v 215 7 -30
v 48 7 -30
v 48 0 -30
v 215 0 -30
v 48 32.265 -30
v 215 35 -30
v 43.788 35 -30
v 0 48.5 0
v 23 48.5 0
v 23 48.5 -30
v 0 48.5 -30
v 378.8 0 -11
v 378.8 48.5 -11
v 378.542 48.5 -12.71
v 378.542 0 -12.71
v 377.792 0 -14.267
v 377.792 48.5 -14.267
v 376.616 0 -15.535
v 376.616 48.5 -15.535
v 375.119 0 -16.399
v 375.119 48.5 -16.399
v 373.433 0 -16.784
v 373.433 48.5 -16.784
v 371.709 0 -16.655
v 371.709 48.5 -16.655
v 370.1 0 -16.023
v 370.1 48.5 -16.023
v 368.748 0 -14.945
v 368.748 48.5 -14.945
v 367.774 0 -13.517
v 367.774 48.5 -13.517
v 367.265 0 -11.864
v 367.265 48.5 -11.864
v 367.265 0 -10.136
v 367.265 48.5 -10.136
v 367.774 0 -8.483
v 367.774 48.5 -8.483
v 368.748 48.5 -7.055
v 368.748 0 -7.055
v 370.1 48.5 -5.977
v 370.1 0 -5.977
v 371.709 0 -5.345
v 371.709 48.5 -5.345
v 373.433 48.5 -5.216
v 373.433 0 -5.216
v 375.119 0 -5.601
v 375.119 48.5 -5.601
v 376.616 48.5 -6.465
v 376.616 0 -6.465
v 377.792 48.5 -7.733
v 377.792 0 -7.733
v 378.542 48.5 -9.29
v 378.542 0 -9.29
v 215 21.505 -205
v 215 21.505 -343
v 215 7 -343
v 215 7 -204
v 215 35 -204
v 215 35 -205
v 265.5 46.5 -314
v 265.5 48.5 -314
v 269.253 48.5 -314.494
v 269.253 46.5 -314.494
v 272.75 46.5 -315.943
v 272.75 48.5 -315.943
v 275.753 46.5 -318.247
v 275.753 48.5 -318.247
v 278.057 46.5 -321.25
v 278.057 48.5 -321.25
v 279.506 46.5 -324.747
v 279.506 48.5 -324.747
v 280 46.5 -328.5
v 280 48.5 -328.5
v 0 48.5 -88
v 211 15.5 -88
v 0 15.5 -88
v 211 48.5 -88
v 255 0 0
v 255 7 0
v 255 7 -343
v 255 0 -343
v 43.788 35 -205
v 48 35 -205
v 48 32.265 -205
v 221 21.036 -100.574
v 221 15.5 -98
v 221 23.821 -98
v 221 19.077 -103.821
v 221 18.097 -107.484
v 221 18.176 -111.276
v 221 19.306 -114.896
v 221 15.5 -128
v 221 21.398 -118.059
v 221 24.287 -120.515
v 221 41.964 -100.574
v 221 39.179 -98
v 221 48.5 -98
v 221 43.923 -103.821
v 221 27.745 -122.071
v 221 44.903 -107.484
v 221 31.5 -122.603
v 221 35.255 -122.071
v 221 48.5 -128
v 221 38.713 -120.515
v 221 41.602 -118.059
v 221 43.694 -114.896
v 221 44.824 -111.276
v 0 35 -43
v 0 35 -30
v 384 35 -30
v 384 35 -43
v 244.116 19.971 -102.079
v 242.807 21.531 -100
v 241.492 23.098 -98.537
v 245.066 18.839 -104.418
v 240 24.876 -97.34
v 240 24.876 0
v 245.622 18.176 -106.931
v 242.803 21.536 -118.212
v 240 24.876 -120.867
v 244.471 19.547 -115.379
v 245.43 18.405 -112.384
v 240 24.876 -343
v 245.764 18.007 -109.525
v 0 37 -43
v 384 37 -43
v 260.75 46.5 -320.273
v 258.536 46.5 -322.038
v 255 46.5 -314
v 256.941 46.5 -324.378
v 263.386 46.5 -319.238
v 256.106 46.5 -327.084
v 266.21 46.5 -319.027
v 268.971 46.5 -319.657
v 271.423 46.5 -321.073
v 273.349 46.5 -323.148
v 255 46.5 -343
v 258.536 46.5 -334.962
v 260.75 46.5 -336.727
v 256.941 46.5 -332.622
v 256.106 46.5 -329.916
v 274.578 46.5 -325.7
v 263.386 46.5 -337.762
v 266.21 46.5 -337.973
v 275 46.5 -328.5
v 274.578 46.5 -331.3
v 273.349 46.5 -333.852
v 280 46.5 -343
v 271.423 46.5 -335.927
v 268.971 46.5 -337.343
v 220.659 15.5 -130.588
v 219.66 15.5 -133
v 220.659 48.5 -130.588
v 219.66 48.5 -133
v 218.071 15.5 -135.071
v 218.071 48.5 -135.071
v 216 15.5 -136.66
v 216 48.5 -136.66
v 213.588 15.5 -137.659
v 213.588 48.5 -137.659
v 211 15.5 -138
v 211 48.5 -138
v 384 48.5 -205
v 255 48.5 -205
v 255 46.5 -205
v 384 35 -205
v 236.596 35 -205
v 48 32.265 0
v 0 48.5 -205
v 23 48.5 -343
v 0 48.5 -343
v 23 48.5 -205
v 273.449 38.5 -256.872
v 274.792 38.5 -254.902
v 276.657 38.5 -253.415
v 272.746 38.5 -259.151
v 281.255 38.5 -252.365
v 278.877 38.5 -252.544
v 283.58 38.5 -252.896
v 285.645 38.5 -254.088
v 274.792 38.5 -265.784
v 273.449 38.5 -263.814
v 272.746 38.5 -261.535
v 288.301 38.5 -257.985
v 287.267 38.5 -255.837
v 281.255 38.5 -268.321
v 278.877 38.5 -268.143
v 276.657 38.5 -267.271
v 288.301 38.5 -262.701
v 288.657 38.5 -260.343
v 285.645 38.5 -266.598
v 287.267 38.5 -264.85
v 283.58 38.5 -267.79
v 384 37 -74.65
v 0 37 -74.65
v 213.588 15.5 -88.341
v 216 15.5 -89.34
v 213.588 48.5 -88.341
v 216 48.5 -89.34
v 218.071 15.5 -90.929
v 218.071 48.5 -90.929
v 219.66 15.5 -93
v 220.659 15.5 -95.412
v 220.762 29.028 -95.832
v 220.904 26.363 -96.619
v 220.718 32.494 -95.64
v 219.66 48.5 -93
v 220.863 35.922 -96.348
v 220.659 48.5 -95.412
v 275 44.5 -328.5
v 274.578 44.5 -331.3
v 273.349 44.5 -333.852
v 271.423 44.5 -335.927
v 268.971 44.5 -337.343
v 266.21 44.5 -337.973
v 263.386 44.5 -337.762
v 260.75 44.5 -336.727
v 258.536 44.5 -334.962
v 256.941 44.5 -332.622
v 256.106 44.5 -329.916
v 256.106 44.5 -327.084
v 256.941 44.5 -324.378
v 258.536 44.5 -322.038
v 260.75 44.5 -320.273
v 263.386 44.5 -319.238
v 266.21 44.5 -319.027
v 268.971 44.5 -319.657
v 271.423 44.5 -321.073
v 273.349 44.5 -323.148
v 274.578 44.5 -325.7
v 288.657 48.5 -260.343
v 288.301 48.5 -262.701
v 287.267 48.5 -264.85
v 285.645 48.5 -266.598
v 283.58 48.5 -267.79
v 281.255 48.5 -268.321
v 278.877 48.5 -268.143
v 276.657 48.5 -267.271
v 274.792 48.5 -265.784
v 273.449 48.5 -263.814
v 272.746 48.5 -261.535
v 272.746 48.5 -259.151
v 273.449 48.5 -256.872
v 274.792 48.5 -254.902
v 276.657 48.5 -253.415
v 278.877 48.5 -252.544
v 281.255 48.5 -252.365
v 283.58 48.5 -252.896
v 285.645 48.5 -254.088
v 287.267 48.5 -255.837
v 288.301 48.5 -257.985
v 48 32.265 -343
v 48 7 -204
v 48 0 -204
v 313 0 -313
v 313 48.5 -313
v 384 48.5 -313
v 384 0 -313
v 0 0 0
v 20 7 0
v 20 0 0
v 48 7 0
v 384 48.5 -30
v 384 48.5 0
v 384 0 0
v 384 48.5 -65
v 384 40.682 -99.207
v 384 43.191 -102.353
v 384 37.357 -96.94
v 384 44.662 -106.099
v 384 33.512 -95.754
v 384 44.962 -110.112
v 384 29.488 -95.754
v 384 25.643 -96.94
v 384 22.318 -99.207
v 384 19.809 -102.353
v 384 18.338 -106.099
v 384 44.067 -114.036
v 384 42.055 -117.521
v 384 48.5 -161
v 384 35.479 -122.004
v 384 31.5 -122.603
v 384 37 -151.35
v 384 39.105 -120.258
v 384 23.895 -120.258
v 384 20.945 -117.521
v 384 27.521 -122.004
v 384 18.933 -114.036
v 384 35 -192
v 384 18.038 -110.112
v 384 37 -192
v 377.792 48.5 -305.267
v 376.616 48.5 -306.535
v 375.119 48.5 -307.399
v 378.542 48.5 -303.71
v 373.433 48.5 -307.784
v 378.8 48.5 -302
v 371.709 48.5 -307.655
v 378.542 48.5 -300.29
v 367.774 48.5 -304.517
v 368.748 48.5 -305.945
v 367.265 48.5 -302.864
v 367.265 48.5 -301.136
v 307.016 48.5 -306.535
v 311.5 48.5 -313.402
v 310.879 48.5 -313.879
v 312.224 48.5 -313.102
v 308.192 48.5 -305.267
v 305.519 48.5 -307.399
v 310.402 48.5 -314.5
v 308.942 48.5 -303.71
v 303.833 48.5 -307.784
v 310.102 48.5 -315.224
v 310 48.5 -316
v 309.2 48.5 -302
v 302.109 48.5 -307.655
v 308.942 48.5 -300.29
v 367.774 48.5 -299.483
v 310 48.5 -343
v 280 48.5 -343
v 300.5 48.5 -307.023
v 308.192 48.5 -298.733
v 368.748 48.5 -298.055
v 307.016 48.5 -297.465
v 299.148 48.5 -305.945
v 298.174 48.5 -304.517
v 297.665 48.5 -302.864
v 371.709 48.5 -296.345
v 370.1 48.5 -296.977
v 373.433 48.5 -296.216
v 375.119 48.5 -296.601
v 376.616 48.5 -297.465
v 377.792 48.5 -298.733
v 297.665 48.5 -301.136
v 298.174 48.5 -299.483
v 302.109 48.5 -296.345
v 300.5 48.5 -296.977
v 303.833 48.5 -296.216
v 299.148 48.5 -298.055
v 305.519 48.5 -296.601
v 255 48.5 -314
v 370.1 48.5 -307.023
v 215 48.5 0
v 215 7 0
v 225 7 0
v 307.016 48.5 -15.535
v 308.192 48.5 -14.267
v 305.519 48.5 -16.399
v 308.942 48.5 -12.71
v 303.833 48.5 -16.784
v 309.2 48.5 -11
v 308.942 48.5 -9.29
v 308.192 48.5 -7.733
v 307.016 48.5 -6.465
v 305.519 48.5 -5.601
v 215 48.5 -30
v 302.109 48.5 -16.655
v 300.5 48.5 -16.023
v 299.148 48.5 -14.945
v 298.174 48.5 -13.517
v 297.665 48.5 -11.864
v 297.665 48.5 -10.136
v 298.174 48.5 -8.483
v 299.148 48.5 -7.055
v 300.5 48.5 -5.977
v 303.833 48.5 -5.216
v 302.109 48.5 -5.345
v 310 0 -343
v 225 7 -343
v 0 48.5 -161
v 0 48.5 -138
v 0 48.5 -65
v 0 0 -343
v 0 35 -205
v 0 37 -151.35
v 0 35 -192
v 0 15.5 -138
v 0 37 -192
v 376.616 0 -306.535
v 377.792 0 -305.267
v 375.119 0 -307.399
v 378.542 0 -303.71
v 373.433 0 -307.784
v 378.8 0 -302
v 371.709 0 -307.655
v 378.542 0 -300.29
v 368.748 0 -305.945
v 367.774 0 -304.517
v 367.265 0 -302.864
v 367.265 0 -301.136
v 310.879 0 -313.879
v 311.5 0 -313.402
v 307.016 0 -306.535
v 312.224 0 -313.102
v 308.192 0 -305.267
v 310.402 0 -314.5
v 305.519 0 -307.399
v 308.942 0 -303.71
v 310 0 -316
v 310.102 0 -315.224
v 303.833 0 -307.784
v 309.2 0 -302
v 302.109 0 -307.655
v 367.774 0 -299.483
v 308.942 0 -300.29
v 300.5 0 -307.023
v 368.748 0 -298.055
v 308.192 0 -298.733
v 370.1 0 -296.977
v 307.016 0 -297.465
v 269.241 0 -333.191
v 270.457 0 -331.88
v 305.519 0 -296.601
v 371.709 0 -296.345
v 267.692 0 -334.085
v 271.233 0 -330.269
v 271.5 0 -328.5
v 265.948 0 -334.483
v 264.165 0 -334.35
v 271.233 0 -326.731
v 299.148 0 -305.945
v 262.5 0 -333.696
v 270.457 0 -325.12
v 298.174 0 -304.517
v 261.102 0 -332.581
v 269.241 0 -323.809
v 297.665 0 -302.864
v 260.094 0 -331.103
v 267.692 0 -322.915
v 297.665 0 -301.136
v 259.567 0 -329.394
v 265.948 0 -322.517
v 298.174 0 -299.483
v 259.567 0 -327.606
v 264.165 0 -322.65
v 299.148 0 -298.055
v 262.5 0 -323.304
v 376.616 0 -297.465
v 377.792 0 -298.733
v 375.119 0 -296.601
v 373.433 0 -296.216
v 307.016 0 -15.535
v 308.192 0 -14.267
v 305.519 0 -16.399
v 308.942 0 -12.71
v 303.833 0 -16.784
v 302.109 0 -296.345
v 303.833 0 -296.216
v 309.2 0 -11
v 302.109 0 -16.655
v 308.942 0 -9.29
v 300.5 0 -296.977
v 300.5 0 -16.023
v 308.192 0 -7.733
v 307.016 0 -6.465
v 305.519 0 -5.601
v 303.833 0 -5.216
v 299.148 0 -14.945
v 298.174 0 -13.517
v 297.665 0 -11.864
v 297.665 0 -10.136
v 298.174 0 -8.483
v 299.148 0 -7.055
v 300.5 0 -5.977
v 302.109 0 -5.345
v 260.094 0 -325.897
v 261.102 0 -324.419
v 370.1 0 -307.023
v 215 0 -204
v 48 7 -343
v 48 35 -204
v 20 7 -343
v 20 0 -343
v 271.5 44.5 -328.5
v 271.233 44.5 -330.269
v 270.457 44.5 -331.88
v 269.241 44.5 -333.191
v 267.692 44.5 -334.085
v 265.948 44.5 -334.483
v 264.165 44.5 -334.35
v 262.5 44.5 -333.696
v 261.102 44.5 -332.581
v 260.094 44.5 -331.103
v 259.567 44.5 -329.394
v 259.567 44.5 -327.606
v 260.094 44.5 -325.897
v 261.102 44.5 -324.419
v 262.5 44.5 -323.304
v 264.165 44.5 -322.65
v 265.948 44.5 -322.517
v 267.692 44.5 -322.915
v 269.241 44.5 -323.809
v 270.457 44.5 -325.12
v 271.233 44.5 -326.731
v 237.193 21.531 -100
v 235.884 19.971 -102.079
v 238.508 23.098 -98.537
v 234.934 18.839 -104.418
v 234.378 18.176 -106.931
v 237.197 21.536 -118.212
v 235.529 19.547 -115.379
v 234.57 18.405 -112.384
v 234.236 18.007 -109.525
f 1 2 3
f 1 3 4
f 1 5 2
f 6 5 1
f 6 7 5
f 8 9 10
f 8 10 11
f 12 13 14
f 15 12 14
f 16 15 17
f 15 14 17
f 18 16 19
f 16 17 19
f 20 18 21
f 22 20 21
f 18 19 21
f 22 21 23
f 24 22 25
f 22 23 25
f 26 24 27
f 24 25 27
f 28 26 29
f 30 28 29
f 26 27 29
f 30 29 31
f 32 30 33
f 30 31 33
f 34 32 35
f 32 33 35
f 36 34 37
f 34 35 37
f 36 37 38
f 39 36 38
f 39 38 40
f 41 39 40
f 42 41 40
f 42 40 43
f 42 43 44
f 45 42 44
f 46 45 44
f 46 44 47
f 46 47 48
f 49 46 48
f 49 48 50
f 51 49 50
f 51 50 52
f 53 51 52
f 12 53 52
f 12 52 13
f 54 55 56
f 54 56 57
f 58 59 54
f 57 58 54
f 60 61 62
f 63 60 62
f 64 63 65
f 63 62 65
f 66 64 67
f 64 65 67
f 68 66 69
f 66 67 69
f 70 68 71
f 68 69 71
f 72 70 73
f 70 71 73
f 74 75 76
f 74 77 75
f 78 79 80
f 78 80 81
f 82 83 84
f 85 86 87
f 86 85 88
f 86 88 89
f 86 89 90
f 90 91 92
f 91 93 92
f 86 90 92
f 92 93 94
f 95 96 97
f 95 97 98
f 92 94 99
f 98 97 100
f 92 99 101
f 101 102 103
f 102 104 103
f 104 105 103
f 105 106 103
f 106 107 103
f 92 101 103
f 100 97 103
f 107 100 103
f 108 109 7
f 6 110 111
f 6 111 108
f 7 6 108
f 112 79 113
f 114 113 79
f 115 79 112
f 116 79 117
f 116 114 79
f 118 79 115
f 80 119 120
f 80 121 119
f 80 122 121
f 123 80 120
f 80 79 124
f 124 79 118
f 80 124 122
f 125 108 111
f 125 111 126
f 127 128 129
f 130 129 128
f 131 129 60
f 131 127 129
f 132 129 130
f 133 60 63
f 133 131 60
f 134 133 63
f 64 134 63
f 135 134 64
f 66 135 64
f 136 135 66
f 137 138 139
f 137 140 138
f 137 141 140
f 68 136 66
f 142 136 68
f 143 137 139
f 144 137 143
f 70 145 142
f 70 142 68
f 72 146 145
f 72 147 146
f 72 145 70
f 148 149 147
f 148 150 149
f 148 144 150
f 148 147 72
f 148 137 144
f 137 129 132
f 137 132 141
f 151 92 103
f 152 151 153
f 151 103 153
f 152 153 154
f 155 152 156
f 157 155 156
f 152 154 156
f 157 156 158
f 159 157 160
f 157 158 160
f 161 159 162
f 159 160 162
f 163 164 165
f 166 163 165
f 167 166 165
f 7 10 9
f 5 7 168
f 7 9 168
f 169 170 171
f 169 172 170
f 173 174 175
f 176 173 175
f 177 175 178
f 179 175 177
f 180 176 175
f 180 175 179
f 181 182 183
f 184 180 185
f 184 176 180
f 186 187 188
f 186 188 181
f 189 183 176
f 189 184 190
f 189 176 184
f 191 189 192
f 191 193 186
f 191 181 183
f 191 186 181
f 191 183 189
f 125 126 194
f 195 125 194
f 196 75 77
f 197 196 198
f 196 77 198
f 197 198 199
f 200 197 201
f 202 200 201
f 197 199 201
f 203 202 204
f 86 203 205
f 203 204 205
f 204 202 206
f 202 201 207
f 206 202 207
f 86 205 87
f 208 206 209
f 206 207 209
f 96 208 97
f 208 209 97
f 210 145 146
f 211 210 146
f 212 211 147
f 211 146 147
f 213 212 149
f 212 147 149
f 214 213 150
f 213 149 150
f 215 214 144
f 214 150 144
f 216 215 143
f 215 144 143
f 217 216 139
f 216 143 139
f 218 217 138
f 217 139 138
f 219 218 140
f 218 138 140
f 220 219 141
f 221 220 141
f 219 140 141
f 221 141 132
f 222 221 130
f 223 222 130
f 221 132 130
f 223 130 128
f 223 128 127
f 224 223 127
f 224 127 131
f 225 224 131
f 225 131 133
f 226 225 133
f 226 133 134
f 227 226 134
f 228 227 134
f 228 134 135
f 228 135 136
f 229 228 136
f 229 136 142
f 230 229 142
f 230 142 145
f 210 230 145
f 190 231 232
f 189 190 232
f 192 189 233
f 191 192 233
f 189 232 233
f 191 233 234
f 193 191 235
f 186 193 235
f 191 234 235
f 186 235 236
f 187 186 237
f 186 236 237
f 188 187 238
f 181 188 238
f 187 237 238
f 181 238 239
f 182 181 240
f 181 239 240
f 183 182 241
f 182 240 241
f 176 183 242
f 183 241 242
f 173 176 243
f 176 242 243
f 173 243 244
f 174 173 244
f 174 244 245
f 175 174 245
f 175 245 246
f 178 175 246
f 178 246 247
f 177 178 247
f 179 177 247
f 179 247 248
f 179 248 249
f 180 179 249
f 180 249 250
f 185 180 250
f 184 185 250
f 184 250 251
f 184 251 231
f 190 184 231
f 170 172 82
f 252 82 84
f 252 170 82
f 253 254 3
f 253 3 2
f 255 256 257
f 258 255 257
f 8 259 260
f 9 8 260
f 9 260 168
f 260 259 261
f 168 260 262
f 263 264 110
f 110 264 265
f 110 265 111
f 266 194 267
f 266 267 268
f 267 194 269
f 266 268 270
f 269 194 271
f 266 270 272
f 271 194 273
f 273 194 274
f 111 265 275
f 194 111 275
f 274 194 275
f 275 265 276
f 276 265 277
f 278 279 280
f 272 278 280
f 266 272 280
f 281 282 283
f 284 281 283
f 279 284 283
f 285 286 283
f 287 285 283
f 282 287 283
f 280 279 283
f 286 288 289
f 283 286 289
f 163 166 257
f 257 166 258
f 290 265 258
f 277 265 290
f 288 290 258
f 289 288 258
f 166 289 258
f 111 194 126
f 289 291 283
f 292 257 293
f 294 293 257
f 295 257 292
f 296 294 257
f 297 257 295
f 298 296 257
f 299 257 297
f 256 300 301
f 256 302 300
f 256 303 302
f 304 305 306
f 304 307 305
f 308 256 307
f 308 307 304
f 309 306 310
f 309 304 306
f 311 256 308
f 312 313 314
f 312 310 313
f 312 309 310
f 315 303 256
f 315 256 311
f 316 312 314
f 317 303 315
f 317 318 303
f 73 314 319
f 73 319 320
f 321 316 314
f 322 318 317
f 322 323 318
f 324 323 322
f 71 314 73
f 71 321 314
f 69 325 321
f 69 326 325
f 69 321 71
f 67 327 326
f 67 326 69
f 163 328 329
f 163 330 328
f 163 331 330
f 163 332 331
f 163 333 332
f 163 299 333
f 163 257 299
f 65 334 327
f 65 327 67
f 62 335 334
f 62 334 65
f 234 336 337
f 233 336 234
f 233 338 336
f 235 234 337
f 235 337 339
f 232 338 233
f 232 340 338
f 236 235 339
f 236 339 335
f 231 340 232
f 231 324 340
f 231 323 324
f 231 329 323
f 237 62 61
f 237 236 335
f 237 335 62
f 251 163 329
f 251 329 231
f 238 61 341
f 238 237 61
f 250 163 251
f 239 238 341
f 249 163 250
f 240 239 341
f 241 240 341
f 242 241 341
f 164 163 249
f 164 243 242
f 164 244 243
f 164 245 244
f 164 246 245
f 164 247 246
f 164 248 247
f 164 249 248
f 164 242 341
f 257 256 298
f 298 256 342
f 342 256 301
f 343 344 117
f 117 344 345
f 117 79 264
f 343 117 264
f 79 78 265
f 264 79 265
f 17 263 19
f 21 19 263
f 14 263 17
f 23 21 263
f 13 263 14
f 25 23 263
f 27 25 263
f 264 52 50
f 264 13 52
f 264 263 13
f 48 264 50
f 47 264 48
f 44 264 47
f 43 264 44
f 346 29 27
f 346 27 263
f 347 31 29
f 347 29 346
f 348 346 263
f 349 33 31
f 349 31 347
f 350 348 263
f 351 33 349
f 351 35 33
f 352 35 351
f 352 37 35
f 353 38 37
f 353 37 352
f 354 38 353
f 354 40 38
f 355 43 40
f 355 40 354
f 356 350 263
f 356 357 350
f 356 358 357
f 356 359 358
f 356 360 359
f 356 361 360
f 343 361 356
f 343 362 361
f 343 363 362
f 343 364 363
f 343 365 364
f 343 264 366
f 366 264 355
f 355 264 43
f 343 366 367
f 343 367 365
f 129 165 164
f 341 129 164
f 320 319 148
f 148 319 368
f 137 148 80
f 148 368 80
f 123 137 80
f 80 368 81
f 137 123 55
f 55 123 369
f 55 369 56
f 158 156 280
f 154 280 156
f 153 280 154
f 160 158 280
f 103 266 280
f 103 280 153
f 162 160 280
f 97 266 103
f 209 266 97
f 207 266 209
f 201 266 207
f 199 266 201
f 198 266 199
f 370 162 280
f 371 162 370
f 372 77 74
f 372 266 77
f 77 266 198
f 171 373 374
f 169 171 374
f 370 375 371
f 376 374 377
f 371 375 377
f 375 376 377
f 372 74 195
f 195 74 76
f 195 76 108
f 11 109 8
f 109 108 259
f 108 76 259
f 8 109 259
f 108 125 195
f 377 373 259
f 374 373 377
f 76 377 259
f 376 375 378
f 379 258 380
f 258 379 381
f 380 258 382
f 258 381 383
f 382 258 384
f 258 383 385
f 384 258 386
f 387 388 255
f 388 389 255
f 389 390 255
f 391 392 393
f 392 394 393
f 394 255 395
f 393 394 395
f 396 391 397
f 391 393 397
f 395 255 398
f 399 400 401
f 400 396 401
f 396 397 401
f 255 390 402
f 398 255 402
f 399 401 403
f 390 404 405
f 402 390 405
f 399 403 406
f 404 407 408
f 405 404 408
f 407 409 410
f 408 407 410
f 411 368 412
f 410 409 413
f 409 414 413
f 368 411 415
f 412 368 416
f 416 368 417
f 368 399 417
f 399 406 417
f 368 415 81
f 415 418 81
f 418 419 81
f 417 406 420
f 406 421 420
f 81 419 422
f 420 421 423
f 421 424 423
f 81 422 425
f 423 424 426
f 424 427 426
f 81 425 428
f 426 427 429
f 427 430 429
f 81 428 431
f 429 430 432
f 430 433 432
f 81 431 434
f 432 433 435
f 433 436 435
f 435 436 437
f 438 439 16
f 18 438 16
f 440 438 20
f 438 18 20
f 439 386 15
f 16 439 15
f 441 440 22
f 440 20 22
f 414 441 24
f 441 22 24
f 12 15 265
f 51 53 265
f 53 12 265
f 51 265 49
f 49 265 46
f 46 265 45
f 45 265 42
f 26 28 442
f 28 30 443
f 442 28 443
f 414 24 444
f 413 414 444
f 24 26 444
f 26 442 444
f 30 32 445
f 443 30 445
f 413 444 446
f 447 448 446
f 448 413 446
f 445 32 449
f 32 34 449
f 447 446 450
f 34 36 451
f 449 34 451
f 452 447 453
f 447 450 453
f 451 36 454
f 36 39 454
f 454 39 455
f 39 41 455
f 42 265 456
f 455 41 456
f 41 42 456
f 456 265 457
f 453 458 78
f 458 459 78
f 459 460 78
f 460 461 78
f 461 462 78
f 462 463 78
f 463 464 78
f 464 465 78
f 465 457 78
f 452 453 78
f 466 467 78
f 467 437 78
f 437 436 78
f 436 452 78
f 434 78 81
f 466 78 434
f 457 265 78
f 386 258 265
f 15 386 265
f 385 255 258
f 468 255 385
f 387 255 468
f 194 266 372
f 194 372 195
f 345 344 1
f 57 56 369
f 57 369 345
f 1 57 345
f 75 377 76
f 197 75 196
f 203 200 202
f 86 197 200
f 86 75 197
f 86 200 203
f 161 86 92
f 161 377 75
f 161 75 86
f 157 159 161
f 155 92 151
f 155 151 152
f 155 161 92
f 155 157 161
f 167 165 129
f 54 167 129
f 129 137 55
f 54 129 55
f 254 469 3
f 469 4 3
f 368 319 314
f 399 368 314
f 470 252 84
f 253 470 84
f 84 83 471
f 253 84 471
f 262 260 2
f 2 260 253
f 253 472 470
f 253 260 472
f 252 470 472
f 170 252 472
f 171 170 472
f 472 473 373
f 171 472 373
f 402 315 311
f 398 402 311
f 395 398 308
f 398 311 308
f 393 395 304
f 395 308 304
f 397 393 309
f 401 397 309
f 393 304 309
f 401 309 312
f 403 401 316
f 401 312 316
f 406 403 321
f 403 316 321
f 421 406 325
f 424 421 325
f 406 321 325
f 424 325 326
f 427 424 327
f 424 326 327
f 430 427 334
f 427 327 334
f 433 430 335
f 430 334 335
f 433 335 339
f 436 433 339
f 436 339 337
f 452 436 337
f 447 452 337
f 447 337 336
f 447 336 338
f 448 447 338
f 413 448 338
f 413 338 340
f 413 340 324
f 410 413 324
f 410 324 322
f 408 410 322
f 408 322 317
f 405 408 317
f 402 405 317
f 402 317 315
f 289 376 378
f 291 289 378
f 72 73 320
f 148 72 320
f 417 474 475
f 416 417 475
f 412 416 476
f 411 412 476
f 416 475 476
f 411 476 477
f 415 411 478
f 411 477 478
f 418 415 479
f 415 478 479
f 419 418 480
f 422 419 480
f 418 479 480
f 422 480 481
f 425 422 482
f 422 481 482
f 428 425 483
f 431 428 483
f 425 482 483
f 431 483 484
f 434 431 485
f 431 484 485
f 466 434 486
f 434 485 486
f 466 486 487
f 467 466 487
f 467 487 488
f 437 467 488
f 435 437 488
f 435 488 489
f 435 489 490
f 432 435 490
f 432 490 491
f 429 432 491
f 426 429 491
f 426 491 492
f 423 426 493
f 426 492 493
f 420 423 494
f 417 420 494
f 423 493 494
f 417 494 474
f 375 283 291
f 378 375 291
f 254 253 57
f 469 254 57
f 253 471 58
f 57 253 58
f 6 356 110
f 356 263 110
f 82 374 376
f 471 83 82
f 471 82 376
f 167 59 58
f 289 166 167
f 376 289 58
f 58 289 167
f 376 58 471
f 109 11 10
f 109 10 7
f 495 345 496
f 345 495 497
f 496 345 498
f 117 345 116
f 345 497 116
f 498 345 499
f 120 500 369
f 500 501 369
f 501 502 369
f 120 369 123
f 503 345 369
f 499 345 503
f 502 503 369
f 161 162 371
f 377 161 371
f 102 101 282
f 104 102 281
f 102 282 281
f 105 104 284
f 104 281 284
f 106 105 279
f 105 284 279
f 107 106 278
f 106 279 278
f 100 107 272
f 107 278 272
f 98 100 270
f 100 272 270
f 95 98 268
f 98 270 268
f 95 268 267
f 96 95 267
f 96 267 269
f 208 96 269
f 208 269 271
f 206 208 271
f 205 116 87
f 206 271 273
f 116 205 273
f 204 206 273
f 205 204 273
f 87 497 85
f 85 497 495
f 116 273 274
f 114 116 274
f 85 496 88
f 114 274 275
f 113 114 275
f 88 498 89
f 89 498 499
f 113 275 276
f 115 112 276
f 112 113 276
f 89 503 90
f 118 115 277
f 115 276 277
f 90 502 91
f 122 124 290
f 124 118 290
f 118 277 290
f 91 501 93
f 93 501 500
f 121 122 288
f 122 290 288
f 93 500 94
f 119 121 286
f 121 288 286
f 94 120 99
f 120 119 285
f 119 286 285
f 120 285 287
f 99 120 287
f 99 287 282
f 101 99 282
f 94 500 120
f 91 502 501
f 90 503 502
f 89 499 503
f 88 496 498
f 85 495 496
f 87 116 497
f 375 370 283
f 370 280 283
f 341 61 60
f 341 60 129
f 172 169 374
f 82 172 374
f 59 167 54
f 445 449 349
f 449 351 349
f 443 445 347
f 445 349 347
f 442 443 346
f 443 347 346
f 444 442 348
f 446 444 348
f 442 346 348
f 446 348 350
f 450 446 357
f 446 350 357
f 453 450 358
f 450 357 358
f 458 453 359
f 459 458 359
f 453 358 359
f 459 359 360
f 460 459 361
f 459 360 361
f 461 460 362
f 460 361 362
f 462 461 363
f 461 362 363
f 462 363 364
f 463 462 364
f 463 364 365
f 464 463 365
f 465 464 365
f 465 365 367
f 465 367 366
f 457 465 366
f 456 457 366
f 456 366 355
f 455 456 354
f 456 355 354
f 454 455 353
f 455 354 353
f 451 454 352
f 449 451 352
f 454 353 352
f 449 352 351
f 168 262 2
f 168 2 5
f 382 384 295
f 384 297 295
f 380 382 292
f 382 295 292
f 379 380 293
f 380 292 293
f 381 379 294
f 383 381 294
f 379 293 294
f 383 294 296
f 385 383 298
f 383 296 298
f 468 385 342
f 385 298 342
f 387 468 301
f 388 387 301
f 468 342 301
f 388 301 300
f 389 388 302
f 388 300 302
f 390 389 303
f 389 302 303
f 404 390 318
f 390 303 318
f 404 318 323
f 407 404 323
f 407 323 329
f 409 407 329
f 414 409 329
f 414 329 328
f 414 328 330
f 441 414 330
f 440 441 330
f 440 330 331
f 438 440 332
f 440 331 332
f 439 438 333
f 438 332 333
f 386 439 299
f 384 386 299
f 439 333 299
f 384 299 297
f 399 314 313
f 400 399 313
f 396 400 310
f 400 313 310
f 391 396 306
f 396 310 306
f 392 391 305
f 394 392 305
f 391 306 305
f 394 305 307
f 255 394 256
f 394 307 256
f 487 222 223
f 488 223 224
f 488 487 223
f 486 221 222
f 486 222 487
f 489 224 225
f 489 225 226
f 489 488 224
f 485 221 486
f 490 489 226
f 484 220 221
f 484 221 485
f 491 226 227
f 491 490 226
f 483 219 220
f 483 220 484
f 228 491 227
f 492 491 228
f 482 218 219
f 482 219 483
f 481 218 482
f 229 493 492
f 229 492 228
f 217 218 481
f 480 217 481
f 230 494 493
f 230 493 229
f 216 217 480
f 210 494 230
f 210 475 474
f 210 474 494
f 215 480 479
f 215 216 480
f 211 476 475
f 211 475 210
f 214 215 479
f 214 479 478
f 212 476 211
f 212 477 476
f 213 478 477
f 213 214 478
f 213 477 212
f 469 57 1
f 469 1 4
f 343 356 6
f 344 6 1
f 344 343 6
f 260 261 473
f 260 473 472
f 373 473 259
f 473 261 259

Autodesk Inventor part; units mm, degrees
ref_plane "YZ Plane" through (0, 0, 0) normal (1, 0, 0) x (0, 1, 0)
ref_plane "XZ Plane" through (0, 0, 0) normal (0, 1, 0) x (-1, 0, 0)
ref_plane "XY Plane" through (0, 0, 0) normal (0, 0, 1) x (1, 0, 0)
sketch "Sketch1" plane through (0, 0, 0) normal (0, 1, 0) x (-1, 0, 0)
  line L0 (0, 0) -> (-384, 0)
  line L1 (-384, 0) -> (-384, -343)
  line L2 (-384, -343) -> (0, -343)
  line L3 (0, -343) -> (0, 0)
  dimension "d0" = 384
  dimension "d1" = 343
extrude "Extrusion1" add sketch "Sketch1" along normal blind 48.5
sketch "Sketch3" plane through (384, 0, 0) normal (1, 0, 0) x (0, 0, -1)
  line L0 (0, 0) -> (343, 0) projected
  line L1 (0, 0) -> (0, 48.5) projected
  line L2 (343, 0) -> (343, 48.5) projected
  line L3 (30, 48.5) -> (65, 48.5)
  line L4 (30, 48.5) -> (30, 37)
  line L5 (65, 48.5) -> (74.6496, 37)
  line L6 (43, 37) -> (74.6496, 37)
  line L7 (30, 37) -> (30, 35)
  line L8 (30, 35) -> (43, 35)
  line L9 (43, 35) -> (43, 37)
  dimension "d23" = 35
  dimension "d37" = 2
  dimension "d38" = 13
extrude "Extrusion2" cut sketch "Sketch3" against normal through all
sketch "Sketch7" plane through (384, 0, 0) normal (1, 0, 0) x (0, 0, -1)
  line L0 (65, 48.5) -> (343, 48.5) projected
  line L1 (65, 48.5) -> (161, 48.5)
  line L2 (161, 48.5) -> (174.2196, 48.5) construction
  line L3 (161, 48.5) -> (205, 48.5)
  line L4 (0, 0) -> (343, 0) projected
  line L5 (151.3504, 37) -> (192, 37)
  line L6 (205, 37) -> (205, 48.5)
  line L7 (161, 48.5) -> (151.3504, 37)
  line L8 (161, 48.5) -> (183.0653, 48.5) construction
  line L9 (205, 37) -> (205, 35)
  line L10 (205, 35) -> (192, 35)
  line L11 (192, 35) -> (192, 37)
  dimension "d27" = 96
  dimension "d29" = 44
  dimension "d32" = 130
extrude "Extrusion3" cut sketch "Sketch7" against normal through all
sketch "Sketch8" plane through (0, 48.5, 0) normal (0, 1, 0) x (1, 0, 0)
  line L0 (310, 343) -> (310, 316)
  line L1 (313, 313) -> (384, 313)
  line L2 (384, 0) -> (384, 343) projected
  line L3 (384, 313) -> (384, 343)
  line L4 (384, 343) -> (310, 343)
  line L5 (384, 343) -> (0, 343) projected
  arc A0 (310, 316) -> (313, 313) centre (313, 316) ccw
  point P0 (0, 0)
  point P1 (310, 313)
  dimension "d43" = 30
  dimension "d46" = 3
extrude "Extrusion4" cut sketch "Sketch8" against normal through all
sketch "Sketch9" plane through (0, 0, -343) normal (0, 0, -1) x (-1, 0, 0)
  line L0 (-215, 7) -> (-225, 7)
  line L1 (-255, 7) -> (-255, 0)
  line L2 (-255, 7) -> (-240, 24.8763)
  line L3 (-225, 7) -> (-240, 24.8763)
  line L4 (-215, 7) -> (-215, 0)
  line L5 (-255, 0) -> (-215, 0)
  dimension "d50" = 10
extrude "Extrusion5" cut sketch "Sketch9" against normal through all
sketch "Sketch10" plane through (0, 48.5, 0) normal (0, 1, 0) x (1, 0, 0)
  line L0 (215, 343) -> (215, 0) projected
  line L1 (215, 343) -> (215, 0) projected
  line L2 (310, 343) -> (0, 343) projected
  line L3 (384, 151.3504) -> (0, 151.3504) projected
  line L4 (215, 343) -> (48, 343)
  line L5 (48, 343) -> (48, 204)
  line L6 (48, 204) -> (215, 204)
  line L7 (215, 204) -> (215, 343)
  point P0 (0, 0)
  dimension "d58" = 167
  dimension "d59" = 139
extrude "Extrusion6" cut sketch "Sketch10" against normal through all
sketch "Sketch11" plane through (0, 0, -343) normal (0, 0, -1) x (-1, 0, 0)
  line L0 (-20, 0) -> (-20, 7)
  line L1 (-20, 7) -> (-48, 7)
  line L2 (-48, 0) -> (-48, 7)
  line L3 (-48, 0) -> (-20, 0)
  dimension "d65" = 7
extrude "Extrusion7" cut sketch "Sketch11" against normal through all
sketch "Sketch12" plane through (0, 48.5, 0) normal (0, 1, 0) x (1, 0, 0)
  line L0 (221, 113) -> (221, 128)
  line L1 (211, 88) -> (0, 88)
  line L2 (211, 138) -> (0, 138)
  arc A0 (211, 88) -> (221, 98) centre (211, 98) ccw
  arc A1 (221, 128) -> (211, 138) centre (211, 128) ccw
  line L3 (221, 98) -> (221, 113)
  line L4 (0, 88) -> (0, 138)
  point P0 (384, 161)
  point P1 (221, 88)
  dimension "d72" = 10
extrude "Extrusion8" cut sketch "Sketch12" against normal blind 33
sketch "Sketch14" plane through (384, 0, 0) normal (1, 0, 0) x (0, 0, -1)
  circle A0 centre (109.1034, 31.5) radius 13.5
  line L0 (65, 48.5) -> (161, 48.5) projected
  point P0 (0, 0)
  dimension "d92" = 27
  dimension "d97" = 17
extrude "Extrusion10" cut sketch "Sketch14" against normal through all
sketch "Sketch17" plane through (0, 0, -343) normal (0, 0, -1) x (-1, 0, 0)
  line L0 (-23, 48.5) -> (-48, 32.2648)
  line L1 (-211, 15.5) -> (0, 15.5) projected
  line L2 (-48, 35) -> (-48, 7) projected
  line L3 (-48, 32.2648) -> (-48, 48.5)
  line L4 (-23, 48.5) -> (-48, 48.5)
  point P0 (0, 0)
  point P1 (0, 48.5)
  dimension "d98" = 23
extrude "Extrusion11" cut sketch "Sketch17" against normal up to surface (138 mm away)
sketch "Sketch19" plane through (310, 0, -343) normal (0, 0, -1) x (-1, 0, 0)
  line L0 (0, 48.5) -> (0, 0) projected
  line L1 (55, 46.5) -> (74.3713, 46.5) construction
  line L2 (55, 46.5) -> (95, 21.5052)
  line L3 (55, 46.5) -> (104.9882, 46.5) construction
  line L4 (55, 46.5) -> (55, 48.5)
  line L5 (55, 48.5) -> (95, 48.5)
  line L6 (89, 48.5) -> (99, 48.5) projected
  line L7 (95, 48.5) -> (95, 21.5052)
  line L8 (95, 7) -> (95, 48.5) projected
  point P0 (310, 0)
  dimension "d109" = 32
extrude "Extrusion12" cut sketch "Sketch19" against normal up to surface (138 mm away)
sketch "Sketch25" plane through (0, 48.5, 0) normal (0, 1, 0) x (1, 0, 0)
  arc A0 (310, 316) -> (313, 313) centre (313, 316) ccw projected
  line L0 (265.5, 314) -> (255, 314)
  line L1 (255, 343) -> (255, 0) projected
  line L2 (310, 343) -> (255, 343) projected
  line L3 (280, 328.5) -> (280, 343)
  arc A1 (265.5, 314) -> (280, 328.5) centre (265.5, 328.5) ccw
  line L4 (280, 343) -> (255, 343)
  line L5 (255, 314) -> (255, 343)
  point P0 (0, 0)
extrude "Extrusion16" cut sketch "Sketch25" against normal blind 2
sketch "Sketch26" plane through (0, 46.5, 0) normal (0, 1, 0) x (1, 0, 0)
  line L0 (280, 343) -> (280, 328.5) projected
  circle A0 centre (265.5, 328.5) radius 9.5
  point P0 (0, 0)
  dimension "d136" = 19
extrude "Extrusion17" cut sketch "Sketch26" against normal blind 2
sketch "Sketch27" plane through (265.5, 44.5, -328.5) normal (0, 1, 0) x (1, 0, 0)
  circle A0 centre (0, 0) radius 6
  point P0 (-265.5, -328.5)
  dimension "d139" = 12
extrude "Extrusion18" cut sketch "Sketch27" against normal through all
sketch "Sketch28" plane through (0, 48.5, 0) normal (0, 1, 0) x (1, 0, 0)
  circle A0 centre (373, 302) radius 5.8
  circle A1 centre (303.4, 302) radius 5.8
  circle A2 centre (373, 11) radius 5.8
  circle A3 centre (303.4, 11) radius 5.8
  point P0 (0, 0)
  point P1 (384, 313)
  point P2 (384, 0)
  dimension "d146" = 11.6
  dimension "d149" = 11.6
  dimension "d152" = 11.6
  dimension "d155" = 11.6
extrude "Extrusion19" cut sketch "Sketch28" against normal through all
sketch "Sketch29" plane through (0, 48.5, 0) normal (0, 0, 1) x (1, 0, 0)
  line L0 (0, -48.5) -> (0, 0) projected
  line L1 (0, 0) -> (384, 0) projected
  line L2 (23, 0) -> (48, -16.2352) projected
  line L3 (23, 0) -> (48, -16.2352)
  line L4 (48, -48.5) -> (215, -48.5) projected
  line L5 (23, 0) -> (48, 0)
  line L6 (48, -16.2352) -> (48, 0)
  line L7 (384, -13.5) -> (0, -13.5) projected
extrude "Extrusion20" cut sketch "Sketch29" against normal up to surface (30 mm away) contours L7 L6 L2 | L2 L1 L6 L7
sketch "Sketch30" plane through (0, 0, 0) normal (0, 0, 1) x (1, 0, 0)
  line L0 (48, 48.5) -> (215, 48.5)
  line L1 (215, 48.5) -> (215, 0)
  line L2 (215, 0) -> (48, 0)
  line L3 (48, 0) -> (48, 48.5)
  point P0 (0, 0)
extrude "Extrusion21" cut sketch "Sketch30" against normal up to surface (30 mm away)
sketch "Sketch32" plane through (0, 48.5, 0) normal (0, 1, 0) x (1, 0, 0)
  line L0 (275, 266) -> (283, 266) construction
  circle A0 centre (280.6569, 260.3431) radius 8
  point P0 (0, 0)
  point P1 (255, 343)
  dimension "d168" = 16
extrude "Extrusion22" cut sketch "Sketch32" against normal blind 10
properties part number "saddle"
